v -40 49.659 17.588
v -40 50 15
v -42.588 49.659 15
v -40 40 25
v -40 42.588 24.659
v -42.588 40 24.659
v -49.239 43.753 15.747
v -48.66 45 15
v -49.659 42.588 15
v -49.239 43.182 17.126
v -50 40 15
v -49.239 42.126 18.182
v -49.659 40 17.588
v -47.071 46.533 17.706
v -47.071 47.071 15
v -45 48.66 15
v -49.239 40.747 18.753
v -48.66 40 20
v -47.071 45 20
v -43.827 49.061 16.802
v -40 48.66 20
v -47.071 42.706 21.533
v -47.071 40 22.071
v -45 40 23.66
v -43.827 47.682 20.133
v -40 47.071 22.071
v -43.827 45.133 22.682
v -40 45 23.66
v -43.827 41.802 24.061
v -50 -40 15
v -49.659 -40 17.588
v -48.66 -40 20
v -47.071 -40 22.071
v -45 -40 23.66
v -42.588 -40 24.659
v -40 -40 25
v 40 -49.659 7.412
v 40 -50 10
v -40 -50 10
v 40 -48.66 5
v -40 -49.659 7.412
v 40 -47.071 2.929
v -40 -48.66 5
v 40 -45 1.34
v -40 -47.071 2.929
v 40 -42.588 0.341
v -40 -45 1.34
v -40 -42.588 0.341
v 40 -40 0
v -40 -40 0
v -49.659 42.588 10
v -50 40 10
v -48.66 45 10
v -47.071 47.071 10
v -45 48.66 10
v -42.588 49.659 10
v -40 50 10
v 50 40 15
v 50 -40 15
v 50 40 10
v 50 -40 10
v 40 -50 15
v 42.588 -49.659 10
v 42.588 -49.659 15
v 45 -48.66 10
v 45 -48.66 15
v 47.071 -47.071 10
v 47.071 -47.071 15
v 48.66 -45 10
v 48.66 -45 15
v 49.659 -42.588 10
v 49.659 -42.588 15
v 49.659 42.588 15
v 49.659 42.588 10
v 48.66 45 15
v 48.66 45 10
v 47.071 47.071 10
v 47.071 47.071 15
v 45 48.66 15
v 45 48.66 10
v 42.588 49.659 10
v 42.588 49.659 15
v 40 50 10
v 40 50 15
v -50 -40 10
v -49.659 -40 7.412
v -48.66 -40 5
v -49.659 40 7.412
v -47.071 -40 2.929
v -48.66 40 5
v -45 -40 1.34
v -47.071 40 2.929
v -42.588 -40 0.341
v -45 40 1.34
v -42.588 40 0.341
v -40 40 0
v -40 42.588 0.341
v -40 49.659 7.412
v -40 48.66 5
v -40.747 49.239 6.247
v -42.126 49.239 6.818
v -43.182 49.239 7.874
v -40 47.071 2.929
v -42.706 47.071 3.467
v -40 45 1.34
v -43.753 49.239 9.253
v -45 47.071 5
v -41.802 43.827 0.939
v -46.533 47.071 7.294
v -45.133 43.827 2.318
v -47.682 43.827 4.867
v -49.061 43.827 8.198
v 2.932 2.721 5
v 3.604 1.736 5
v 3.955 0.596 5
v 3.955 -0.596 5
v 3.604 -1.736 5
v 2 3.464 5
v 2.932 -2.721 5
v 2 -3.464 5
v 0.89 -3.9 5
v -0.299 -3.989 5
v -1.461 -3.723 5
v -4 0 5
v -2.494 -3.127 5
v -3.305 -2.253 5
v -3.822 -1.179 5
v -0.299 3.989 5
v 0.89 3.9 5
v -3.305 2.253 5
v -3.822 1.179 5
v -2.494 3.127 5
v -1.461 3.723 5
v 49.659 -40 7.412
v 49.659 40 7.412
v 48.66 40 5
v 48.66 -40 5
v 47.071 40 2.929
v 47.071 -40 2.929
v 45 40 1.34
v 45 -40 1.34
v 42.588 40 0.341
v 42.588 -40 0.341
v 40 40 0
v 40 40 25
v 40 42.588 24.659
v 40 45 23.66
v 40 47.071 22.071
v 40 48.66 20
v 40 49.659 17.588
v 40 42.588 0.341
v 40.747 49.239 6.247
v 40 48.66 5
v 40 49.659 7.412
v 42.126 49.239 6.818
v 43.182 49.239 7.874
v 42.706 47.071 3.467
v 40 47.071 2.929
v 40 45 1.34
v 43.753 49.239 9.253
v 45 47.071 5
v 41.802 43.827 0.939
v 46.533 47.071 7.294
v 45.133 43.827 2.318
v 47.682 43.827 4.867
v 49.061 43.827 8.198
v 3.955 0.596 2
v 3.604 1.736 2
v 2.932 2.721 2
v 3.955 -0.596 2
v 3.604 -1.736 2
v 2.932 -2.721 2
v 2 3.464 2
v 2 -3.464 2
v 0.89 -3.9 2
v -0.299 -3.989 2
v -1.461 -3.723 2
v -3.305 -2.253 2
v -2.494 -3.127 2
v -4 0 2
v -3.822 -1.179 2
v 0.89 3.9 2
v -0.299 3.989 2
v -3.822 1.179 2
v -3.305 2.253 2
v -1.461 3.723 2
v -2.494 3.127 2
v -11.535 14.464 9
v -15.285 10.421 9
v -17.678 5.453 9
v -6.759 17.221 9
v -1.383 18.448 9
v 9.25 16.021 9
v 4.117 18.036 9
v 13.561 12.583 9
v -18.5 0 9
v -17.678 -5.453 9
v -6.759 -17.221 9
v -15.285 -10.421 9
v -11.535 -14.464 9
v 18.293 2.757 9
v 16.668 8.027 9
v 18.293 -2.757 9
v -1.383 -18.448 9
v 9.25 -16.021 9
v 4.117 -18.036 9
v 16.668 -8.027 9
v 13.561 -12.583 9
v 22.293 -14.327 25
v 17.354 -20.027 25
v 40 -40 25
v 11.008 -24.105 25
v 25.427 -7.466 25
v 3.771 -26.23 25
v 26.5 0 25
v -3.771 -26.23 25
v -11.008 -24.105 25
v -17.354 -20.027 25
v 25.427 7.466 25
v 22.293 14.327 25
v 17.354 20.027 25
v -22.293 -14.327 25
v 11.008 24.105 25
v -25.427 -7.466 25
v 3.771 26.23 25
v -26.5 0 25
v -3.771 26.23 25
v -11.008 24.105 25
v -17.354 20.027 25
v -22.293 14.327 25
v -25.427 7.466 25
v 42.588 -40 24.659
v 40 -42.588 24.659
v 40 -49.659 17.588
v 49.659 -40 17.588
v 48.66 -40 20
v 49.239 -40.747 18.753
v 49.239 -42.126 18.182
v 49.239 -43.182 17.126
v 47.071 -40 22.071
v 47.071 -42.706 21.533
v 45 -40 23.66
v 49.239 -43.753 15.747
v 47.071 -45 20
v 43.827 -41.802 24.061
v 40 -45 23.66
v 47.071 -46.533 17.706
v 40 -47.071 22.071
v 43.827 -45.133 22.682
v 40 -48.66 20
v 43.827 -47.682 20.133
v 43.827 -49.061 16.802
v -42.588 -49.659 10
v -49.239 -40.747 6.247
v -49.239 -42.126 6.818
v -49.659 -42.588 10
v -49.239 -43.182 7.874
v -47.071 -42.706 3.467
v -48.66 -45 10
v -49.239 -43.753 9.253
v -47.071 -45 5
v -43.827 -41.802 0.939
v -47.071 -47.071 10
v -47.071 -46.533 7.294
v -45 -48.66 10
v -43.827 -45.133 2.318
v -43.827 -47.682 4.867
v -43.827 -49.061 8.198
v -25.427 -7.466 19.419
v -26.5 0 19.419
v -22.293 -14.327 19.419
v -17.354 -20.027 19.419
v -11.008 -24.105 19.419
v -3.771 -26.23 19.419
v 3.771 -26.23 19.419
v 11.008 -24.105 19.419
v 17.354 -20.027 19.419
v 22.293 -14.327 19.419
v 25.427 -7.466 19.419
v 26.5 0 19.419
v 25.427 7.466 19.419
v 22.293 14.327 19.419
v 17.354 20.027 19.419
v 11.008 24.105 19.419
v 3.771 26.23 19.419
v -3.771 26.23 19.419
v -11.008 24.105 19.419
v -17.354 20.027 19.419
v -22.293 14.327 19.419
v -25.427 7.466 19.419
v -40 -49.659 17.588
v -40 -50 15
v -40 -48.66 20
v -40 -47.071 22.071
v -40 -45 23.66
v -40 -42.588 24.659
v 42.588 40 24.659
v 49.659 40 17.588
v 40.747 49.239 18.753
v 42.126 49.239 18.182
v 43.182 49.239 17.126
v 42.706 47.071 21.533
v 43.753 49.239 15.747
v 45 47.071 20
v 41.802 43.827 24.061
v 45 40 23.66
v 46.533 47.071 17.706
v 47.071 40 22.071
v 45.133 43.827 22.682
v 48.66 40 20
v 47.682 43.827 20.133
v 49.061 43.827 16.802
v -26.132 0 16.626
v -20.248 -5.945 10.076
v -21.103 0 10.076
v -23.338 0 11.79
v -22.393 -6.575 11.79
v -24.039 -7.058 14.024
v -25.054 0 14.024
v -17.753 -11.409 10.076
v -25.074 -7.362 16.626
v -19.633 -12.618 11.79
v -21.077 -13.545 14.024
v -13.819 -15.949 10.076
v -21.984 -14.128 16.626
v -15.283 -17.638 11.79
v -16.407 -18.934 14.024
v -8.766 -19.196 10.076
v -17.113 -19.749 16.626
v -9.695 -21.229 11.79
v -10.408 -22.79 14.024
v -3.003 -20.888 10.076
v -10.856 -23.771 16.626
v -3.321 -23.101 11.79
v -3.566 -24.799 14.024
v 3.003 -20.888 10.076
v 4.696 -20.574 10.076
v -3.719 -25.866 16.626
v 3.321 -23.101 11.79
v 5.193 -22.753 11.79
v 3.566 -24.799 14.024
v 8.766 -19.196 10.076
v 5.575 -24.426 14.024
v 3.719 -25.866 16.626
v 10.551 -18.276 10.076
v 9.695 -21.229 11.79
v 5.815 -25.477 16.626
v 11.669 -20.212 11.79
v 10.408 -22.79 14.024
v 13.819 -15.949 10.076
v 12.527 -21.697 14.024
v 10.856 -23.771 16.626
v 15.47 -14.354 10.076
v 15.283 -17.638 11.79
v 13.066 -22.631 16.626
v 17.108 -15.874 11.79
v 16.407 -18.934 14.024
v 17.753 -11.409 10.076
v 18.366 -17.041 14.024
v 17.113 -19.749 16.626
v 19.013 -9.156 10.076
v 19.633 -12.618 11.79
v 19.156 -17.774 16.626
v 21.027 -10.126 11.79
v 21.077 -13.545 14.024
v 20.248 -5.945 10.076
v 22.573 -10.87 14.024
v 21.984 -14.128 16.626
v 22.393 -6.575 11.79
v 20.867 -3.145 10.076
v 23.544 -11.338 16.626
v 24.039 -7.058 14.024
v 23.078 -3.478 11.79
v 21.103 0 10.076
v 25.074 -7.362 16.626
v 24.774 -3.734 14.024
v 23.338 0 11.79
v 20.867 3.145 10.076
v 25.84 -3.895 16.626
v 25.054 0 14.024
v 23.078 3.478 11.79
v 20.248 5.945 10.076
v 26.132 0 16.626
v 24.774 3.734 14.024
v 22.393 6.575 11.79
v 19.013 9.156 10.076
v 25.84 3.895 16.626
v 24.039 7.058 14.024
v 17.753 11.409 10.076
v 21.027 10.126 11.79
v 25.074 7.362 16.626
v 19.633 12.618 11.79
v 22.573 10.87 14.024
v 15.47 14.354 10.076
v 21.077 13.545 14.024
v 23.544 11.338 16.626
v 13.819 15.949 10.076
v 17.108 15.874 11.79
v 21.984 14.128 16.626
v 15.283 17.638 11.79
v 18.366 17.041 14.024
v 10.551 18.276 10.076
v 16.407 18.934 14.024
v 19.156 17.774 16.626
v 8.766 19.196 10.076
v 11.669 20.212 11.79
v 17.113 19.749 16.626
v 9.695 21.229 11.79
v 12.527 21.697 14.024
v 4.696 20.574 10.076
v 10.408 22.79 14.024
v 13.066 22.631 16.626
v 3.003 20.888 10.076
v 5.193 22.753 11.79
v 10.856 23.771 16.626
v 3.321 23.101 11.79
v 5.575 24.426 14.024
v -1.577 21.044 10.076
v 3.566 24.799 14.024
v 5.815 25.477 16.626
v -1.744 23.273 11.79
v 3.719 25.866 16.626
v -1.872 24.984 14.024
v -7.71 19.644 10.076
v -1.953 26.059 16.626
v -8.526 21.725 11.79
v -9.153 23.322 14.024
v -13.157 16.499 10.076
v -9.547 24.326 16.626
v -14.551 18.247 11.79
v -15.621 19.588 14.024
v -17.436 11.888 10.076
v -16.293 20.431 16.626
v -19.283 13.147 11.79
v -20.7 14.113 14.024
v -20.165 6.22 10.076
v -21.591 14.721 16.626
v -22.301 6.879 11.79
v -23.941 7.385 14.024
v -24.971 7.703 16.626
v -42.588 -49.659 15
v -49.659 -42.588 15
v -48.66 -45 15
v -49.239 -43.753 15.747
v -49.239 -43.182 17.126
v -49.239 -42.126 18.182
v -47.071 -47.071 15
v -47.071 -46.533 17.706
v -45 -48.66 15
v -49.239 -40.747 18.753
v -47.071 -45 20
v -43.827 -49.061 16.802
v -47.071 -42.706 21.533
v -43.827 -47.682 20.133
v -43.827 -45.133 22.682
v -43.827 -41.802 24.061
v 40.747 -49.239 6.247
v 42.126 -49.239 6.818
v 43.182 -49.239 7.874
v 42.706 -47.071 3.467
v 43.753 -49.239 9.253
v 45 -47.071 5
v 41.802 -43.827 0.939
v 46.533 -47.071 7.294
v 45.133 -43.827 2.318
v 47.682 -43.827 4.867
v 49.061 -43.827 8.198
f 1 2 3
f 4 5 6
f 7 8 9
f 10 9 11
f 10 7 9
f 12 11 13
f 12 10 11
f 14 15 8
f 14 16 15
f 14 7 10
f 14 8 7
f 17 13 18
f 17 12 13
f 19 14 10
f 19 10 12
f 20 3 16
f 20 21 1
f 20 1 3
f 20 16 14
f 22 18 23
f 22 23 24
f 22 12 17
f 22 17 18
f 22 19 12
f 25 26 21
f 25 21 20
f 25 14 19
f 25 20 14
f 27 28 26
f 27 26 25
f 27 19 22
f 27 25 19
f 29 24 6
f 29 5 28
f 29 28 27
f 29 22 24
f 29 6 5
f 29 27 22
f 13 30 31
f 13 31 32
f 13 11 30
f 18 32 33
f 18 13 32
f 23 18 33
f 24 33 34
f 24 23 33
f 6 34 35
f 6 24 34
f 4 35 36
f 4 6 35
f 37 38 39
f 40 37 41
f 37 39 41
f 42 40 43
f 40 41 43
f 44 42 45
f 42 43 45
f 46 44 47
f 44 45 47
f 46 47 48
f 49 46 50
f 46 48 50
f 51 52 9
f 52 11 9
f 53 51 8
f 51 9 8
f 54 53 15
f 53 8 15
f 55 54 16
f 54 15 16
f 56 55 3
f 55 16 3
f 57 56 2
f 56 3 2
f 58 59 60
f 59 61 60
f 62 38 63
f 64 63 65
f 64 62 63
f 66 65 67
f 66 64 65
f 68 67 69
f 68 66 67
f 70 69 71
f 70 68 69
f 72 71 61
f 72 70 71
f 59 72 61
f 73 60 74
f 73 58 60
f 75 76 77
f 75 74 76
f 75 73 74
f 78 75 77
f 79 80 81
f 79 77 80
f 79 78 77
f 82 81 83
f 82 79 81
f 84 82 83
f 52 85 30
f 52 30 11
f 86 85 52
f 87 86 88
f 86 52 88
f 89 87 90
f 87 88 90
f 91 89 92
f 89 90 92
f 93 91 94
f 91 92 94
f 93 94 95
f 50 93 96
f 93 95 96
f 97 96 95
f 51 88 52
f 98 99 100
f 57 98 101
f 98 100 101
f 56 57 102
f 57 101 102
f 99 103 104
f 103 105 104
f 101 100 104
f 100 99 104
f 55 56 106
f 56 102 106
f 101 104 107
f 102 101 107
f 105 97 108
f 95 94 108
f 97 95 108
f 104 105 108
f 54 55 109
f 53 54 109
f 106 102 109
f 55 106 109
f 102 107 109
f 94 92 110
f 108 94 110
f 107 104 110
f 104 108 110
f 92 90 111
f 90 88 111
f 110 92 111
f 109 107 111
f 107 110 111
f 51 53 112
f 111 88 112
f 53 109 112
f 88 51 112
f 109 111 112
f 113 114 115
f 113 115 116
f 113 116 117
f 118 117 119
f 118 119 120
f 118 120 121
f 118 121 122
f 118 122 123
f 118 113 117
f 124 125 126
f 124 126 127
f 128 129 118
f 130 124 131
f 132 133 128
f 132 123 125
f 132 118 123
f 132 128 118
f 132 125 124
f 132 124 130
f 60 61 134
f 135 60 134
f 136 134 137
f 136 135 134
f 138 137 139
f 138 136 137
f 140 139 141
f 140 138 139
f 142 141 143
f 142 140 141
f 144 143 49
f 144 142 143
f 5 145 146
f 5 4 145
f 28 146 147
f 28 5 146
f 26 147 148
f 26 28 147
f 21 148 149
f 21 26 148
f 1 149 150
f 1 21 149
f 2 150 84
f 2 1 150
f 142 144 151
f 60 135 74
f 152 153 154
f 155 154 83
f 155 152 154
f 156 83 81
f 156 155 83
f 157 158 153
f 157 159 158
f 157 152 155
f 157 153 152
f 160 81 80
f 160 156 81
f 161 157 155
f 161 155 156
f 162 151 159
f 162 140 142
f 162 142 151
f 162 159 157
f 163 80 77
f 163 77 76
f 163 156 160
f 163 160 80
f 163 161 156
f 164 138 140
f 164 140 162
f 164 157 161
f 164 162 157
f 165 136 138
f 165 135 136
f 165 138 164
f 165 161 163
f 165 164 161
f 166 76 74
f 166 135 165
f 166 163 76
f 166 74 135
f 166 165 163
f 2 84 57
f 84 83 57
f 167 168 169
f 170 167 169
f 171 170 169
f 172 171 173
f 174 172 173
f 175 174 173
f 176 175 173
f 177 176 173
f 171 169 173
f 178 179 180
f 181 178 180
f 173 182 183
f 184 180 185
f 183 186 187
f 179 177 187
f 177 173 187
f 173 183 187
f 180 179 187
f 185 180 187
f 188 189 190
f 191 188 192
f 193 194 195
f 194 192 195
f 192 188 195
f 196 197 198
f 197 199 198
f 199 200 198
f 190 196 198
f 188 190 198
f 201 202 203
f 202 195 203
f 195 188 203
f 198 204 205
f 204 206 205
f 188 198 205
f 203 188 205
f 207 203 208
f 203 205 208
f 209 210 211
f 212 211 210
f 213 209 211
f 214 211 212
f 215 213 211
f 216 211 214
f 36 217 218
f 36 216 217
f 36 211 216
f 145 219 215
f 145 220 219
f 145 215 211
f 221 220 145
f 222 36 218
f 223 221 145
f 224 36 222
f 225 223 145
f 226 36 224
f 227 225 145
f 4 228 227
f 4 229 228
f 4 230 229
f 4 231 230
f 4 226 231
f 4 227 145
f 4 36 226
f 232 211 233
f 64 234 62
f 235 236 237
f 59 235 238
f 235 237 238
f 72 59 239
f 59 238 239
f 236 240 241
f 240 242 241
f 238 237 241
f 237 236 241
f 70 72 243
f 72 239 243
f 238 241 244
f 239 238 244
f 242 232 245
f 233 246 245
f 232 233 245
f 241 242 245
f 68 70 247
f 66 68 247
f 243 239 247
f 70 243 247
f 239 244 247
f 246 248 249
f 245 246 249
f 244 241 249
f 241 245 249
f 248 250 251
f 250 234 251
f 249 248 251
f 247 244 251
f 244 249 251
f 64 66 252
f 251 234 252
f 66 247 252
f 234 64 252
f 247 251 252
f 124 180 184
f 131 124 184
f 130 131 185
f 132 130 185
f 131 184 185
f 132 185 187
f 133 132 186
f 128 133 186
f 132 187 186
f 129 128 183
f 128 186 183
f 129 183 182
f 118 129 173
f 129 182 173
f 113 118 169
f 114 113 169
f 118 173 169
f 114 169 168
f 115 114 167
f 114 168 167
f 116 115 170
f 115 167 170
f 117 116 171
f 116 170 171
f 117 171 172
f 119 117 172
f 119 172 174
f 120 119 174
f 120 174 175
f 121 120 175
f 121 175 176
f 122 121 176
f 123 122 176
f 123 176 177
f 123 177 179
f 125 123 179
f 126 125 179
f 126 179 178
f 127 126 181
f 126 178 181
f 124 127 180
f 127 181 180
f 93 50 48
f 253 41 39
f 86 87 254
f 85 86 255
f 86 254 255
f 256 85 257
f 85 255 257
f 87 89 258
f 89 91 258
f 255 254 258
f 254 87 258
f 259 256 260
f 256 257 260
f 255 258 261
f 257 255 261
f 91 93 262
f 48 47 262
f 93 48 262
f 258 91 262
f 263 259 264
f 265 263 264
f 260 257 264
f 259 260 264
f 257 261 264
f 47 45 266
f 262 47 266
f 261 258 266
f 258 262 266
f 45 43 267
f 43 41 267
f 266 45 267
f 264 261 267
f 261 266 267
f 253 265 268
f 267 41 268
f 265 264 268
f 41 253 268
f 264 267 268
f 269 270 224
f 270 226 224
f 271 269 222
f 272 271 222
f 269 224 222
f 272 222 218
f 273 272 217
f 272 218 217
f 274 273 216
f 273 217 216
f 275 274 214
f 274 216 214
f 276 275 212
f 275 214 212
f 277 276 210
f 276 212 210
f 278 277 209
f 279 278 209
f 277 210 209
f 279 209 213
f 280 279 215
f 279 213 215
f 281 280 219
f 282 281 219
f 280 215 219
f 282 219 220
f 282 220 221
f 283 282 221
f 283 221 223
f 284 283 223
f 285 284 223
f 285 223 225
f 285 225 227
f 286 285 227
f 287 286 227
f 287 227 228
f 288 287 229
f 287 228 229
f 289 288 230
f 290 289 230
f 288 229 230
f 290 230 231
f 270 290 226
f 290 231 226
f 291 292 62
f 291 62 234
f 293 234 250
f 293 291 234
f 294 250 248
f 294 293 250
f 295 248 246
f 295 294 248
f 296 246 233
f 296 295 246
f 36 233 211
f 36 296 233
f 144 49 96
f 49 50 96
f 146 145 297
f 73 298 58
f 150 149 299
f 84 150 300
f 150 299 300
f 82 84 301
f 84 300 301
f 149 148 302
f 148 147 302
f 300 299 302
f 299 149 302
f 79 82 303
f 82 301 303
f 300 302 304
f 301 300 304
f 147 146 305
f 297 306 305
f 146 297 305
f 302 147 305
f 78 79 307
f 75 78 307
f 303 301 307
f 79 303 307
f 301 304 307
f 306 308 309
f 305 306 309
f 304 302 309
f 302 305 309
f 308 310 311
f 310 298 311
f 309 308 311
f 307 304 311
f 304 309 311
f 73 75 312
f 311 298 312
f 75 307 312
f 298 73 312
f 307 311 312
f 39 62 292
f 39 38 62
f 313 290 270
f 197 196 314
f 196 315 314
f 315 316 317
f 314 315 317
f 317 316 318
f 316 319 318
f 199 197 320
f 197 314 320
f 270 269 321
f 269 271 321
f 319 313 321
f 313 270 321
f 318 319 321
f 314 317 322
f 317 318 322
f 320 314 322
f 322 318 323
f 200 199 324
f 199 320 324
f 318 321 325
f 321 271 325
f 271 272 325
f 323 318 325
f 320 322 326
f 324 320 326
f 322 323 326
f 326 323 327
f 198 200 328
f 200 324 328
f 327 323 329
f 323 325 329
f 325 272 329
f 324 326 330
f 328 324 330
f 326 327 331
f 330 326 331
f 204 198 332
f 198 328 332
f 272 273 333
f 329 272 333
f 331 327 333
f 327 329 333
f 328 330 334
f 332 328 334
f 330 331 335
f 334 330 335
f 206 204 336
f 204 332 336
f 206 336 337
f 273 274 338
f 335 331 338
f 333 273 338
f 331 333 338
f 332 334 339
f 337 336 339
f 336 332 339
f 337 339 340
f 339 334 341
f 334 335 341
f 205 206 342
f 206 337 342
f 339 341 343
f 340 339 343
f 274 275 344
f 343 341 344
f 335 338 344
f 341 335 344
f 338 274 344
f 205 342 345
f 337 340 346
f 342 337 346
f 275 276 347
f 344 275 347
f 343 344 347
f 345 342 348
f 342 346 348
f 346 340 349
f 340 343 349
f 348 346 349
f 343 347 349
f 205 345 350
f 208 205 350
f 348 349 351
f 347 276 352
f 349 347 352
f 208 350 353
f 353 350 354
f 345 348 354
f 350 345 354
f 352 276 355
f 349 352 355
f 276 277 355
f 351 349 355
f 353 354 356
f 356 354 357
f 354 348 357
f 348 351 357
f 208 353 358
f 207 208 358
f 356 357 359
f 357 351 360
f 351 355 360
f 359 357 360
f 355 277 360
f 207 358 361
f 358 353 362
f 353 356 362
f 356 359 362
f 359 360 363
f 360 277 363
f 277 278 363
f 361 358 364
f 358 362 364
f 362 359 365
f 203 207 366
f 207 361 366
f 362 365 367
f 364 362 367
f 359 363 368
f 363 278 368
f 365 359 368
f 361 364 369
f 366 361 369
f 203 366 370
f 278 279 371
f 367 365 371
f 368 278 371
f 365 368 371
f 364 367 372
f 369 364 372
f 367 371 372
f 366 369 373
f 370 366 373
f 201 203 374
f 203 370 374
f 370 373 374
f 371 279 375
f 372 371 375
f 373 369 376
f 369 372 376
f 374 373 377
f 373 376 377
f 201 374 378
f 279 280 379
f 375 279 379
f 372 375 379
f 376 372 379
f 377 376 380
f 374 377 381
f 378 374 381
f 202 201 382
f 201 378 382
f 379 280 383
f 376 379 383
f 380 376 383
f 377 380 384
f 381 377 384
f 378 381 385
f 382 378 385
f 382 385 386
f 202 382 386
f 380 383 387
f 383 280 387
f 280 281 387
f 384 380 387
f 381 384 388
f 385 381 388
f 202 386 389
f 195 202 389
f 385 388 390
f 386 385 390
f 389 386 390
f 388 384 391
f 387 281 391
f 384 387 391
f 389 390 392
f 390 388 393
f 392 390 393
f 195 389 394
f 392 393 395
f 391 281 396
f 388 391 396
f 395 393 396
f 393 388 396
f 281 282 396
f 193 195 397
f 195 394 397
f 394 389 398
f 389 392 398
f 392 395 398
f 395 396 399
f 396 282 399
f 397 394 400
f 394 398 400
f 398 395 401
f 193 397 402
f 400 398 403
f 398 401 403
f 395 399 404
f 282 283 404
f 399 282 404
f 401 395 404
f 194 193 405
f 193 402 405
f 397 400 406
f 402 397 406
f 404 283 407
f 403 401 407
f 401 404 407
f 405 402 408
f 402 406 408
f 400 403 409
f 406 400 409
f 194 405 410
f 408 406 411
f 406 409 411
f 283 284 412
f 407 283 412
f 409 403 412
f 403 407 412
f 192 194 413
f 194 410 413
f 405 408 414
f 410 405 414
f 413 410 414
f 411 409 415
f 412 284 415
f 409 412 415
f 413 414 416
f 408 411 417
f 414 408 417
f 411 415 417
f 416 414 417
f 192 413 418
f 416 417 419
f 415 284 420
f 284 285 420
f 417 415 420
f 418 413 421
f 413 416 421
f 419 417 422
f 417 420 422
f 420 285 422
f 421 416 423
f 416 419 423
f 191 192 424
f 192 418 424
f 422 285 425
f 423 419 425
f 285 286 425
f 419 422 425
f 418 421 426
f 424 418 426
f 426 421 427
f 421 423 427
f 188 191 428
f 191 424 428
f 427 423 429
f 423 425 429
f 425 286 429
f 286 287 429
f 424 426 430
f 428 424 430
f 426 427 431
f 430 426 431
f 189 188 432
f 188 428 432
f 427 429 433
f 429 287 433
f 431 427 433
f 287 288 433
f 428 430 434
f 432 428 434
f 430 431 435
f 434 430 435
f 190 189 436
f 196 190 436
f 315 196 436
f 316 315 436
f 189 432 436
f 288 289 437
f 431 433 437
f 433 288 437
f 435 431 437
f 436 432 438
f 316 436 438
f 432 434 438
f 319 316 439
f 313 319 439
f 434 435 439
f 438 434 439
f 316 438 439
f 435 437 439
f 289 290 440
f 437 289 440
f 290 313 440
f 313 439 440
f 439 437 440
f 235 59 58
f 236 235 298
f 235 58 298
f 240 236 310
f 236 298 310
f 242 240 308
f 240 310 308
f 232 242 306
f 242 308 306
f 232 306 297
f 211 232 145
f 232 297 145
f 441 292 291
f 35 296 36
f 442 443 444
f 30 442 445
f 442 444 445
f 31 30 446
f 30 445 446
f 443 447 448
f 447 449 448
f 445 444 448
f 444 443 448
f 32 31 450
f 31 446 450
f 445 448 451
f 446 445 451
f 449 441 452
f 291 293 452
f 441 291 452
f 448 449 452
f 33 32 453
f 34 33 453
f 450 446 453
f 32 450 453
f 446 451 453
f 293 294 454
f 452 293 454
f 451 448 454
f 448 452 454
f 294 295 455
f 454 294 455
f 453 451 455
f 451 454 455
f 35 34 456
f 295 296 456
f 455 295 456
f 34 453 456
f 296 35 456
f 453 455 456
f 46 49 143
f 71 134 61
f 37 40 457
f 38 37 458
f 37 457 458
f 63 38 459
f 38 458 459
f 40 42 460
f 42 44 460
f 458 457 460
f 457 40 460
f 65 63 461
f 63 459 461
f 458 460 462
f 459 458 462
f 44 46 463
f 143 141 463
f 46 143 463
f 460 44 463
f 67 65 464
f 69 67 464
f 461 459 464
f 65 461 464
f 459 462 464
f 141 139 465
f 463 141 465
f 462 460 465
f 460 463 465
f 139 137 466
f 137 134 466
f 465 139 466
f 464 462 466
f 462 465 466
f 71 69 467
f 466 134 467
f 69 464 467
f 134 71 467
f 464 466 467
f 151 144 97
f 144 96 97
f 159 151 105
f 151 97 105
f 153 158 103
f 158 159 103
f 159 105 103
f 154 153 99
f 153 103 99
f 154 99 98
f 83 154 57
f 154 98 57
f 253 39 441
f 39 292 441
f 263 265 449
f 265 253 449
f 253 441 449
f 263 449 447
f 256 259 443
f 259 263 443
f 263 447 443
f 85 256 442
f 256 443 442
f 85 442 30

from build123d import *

# Parameters (mm, degrees)
SKETCH1_W           = 100
SKETCH1_H           = 100
BOSS_EXTRUDE1_DEPTH = 25
FILLET2_R           = 10
CUT_EXTRUDE1_START  = -2
SKETCH5_R           = 4
CUT_EXTRUDE1_DEPTH  = 3


with BuildPart() as part:
    # Sketch1 → Boss-Extrude1 (new body)
    with BuildSketch(Plane(origin=(0, 0, 0), x_dir=(0, 1, 0), z_dir=(0, 0, 1))):
        Rectangle(SKETCH1_W, SKETCH1_H)
    extrude(amount=BOSS_EXTRUDE1_DEPTH)

    # Sketch4 → Cut-Revolve2 (revolve, cut)
    with BuildSketch(Plane(origin=(0, 0, 0), x_dir=(0, -1, 0), z_dir=(-1, 0, 0))):
        with BuildLine():
            Line((0, 25), (0, 9))
            Line((0, 9), (-18.5, 9))
            ThreePointArc((-18.5, 9), (-24.269303538, 12.850991806), (-26.5, 19.41902001))
            Line((-26.5, 19.41902001), (-26.5, 25))
            Line((-26.5, 25), (0, 25))
        make_face()
    revolve(axis=Axis((0, 0, 0), (0, 0, 1)), mode=Mode.SUBTRACT)

    # Fillet2
    fillet2_edges = [part.edges().sort_by_distance(p)[0] for p in [
        (0, -50, 25),
        (0, -50, 0),
        (50, -50, 12.5),
        (50, 0, 25),
        (50, 0, 0),
        (-50, 0, 25),
        (-50, -50, 12.5),
        (-50, 0, 0),
        (50, 50, 12.5),
        (0, 50, 25),
        (-50, 50, 12.5),
        (0, 50, 0),
    ]]
    fillet(fillet2_edges, radius=FILLET2_R)

    # Sketch5 → Cut-Extrude1 (cut)
    with BuildSketch(Plane(origin=(0, 0, 0), x_dir=(1, 0, 0), z_dir=(0, 0, -1)).offset(CUT_EXTRUDE1_START)):
        Circle(SKETCH5_R)
    extrude(amount=-CUT_EXTRUDE1_DEPTH, mode=Mode.SUBTRACT)


solid = part.part
